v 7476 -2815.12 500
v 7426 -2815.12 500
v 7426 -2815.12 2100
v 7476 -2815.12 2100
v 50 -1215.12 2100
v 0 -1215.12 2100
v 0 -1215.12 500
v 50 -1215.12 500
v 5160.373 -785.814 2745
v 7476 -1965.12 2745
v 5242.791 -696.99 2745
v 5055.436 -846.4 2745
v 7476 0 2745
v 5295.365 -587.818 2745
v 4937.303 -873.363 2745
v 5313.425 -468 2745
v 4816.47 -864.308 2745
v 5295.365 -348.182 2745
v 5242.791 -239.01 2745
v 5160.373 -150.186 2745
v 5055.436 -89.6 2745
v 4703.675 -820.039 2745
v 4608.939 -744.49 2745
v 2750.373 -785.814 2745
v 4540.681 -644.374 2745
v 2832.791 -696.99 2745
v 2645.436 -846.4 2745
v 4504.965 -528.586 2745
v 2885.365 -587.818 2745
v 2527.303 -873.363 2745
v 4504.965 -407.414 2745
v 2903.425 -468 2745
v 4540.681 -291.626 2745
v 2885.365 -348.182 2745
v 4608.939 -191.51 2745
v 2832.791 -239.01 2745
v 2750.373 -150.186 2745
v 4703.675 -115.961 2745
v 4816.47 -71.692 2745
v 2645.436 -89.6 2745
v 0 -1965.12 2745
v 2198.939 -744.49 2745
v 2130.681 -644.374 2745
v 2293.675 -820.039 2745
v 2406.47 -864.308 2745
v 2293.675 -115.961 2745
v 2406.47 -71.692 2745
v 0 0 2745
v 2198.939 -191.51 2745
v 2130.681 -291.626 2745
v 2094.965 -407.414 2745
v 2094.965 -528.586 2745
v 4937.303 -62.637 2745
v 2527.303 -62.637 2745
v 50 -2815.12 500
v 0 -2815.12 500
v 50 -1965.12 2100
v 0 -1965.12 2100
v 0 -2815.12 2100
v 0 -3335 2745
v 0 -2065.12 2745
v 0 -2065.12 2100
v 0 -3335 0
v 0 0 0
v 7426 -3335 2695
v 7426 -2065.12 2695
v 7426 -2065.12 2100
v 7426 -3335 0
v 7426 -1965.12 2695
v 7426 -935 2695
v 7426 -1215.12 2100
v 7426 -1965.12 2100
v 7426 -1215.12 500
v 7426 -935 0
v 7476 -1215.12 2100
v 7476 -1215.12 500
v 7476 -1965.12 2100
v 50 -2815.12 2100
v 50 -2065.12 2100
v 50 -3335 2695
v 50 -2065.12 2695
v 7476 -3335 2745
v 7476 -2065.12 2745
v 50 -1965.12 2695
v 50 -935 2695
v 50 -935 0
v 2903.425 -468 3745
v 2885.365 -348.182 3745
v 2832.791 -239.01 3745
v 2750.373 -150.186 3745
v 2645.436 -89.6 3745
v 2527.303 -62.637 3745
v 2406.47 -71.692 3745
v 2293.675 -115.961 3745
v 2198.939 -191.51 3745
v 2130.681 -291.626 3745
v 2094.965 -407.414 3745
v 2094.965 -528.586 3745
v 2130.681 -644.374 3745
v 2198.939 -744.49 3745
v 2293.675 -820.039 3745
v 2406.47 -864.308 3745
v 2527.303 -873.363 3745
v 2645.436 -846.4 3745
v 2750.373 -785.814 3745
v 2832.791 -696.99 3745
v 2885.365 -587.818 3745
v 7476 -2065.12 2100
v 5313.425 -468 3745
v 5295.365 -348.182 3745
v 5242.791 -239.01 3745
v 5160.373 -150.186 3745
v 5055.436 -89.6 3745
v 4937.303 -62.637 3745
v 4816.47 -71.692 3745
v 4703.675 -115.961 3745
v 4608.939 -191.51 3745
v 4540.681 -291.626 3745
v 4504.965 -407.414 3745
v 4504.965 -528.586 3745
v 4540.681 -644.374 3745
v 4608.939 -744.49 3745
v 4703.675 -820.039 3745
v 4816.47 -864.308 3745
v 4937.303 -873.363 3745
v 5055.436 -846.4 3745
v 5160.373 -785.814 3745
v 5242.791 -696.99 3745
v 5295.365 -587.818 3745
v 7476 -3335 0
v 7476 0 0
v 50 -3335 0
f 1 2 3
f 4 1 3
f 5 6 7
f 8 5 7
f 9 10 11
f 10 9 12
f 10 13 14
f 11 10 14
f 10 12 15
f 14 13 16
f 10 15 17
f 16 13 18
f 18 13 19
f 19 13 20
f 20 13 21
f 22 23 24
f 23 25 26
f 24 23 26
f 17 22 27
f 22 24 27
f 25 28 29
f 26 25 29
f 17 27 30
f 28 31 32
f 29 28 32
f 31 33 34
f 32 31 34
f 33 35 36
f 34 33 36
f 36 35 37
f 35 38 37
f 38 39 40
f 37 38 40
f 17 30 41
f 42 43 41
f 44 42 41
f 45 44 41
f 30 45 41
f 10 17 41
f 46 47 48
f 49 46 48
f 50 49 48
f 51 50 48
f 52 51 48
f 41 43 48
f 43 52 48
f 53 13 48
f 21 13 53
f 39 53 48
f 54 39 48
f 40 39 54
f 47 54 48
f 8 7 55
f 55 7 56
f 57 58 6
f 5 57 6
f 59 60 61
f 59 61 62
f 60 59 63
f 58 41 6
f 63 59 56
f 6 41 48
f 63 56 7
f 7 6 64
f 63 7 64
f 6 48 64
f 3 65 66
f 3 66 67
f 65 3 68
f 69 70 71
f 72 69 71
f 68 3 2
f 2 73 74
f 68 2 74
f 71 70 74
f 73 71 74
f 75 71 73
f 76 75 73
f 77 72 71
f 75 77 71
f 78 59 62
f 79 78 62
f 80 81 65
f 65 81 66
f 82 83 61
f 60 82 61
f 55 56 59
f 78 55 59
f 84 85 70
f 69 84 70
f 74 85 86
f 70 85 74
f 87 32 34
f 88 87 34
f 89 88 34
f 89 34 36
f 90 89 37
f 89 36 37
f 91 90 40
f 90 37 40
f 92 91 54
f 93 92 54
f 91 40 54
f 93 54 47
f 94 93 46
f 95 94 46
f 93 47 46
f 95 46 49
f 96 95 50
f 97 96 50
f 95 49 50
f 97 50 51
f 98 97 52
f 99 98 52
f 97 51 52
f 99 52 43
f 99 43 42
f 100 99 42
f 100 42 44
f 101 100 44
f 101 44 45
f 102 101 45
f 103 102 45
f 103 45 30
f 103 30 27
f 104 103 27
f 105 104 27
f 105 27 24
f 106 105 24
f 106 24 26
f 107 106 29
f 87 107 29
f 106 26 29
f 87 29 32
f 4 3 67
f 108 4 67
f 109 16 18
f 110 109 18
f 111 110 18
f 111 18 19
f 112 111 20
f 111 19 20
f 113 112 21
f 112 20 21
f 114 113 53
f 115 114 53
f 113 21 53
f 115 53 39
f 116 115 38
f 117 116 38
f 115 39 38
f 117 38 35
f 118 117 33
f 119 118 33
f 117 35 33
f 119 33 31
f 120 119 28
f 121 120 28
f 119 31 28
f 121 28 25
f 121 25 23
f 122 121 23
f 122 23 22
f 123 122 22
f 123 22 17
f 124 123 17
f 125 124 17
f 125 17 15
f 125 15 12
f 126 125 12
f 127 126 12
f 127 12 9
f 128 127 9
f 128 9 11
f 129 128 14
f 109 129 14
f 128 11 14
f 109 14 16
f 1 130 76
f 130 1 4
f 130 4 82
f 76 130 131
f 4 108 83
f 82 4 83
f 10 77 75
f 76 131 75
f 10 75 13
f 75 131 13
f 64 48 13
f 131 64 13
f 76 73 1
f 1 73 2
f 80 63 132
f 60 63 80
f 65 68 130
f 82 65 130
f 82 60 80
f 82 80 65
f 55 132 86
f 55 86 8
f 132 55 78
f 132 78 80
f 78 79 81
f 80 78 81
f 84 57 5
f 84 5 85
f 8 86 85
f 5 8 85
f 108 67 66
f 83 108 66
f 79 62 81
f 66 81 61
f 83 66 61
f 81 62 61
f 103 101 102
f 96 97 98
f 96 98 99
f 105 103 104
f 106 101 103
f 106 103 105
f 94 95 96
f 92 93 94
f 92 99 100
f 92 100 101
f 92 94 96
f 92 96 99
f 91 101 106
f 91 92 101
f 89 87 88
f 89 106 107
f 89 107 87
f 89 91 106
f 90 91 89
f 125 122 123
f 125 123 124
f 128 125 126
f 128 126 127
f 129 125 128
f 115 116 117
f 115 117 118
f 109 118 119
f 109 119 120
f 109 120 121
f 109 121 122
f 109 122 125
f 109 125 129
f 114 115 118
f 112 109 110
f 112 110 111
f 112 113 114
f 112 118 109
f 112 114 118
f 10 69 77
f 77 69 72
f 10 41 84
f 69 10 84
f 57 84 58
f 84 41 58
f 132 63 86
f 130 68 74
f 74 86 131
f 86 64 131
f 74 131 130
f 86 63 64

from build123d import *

# Parameters (mm, degrees)
F0_W     = 7476
F0_H     = 2745
F1_DEPTH = 935
F3_R     = 406.5
F4_DEPTH = 1000
F6_DEPTH = 2400
F8_DEPTH = 7476.001


with BuildPart() as f1:
    # F0 (on Front) → F1 (new body)
    with BuildSketch(Plane.XZ):
        with Locations((3738, 1372.5)):
            Rectangle(F0_W, F0_H)
    extrude(amount=F1_DEPTH)

    # F3 (on face) → F4 (join)
    with BuildSketch(Plane.XY.offset(2745)):
        with Locations((2496.924886, -468)):
            Circle(F3_R)
        with Locations((4906.924886, -468)):
            Circle(F3_R)
    extrude(amount=F4_DEPTH)

    # F5 (on face) → F6 (join)
    with BuildSketch(Plane.XZ.offset(935)):
        Polygon((0, 2745), (0, 0), (50, 0), (50, 2695), (7426, 2695), (7426, 0), (7476, 0), (7476, 2745), align=None)
    extrude(amount=F6_DEPTH)

    # F7 (on face) → F8 (cut, through all)
    with BuildSketch(Plane(origin=(0, 0, 0), x_dir=(0, -1, 0), z_dir=(-1, 0, 0))):
        Polygon((2065.119958, 2745), (1965.119958, 2745), (1965.119958, 2100), (1215.119958, 2100), (1215.119958, 500), (2815.119958, 500), (2815.119958, 2100), (2065.119958, 2100), align=None)
    extrude(amount=-F8_DEPTH, mode=Mode.SUBTRACT)


solid = f1.part
